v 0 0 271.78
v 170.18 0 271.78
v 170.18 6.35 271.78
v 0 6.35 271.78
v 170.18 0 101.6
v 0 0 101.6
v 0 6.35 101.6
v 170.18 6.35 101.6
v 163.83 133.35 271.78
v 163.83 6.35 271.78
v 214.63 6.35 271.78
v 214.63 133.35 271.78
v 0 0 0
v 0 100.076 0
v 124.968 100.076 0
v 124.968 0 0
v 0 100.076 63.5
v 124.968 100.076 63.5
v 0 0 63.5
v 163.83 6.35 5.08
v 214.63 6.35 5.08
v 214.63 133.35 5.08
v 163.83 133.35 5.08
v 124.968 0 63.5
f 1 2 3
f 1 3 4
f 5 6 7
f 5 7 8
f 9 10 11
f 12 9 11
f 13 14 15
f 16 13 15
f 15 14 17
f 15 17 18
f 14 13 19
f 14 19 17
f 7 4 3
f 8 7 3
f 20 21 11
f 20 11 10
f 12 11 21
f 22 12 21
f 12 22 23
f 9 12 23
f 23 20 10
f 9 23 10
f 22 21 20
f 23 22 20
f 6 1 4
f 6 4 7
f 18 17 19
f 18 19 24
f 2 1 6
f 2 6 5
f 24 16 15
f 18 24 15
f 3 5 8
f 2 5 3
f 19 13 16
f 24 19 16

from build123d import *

# Parameters (mm, degrees)
F0_W     = 124.968
F0_H     = 100.076
F1_DEPTH = 63.5
F2_W     = 6.3500028181
F2_H     = 170.18
F3_DEPTH = 6.35
F4_W     = 6.3500028181
F4_H     = 170.18
F5_DEPTH = 127


with BuildPart() as f1:
    # F0 (on Top) → F1 (new body)
    with BuildSketch(Plane.XY):
        with Locations((62.484, 50.038)):
            Rectangle(F0_W, F0_H)
    extrude(amount=F1_DEPTH)


with BuildPart() as f3:
    # F2 (on face) → F3 (new body)
    with BuildSketch(Plane.XZ):
        Polygon((0, 271.78), (0, 101.6), (124.968, 101.6), (163.8299971819, 101.6), (163.8299971819, 271.78), align=None)
        with Locations((167.0049985909, 186.69)):
            Rectangle(F2_W, F2_H)
    extrude(amount=-F3_DEPTH)


with BuildPart() as f5:
    # F4 (on face) → F5 (new body)
    with BuildSketch(Plane(origin=(0, 6.35, 0), x_dir=(-1, 0, 0), z_dir=(0, 1, 0))):
        Polygon((-163.8299971819, 101.6), (-170.18, 101.6), (-170.18, 271.78), (-214.6299971819, 271.78), (-214.6299971819, 5.08), (-163.8299971819, 5.08), align=None)
        with Locations((-167.0049985909, 186.69)):
            Rectangle(F4_W, F4_H)
    extrude(amount=F5_DEPTH)


solid = Compound([f1.part, f3.part, f5.part])
